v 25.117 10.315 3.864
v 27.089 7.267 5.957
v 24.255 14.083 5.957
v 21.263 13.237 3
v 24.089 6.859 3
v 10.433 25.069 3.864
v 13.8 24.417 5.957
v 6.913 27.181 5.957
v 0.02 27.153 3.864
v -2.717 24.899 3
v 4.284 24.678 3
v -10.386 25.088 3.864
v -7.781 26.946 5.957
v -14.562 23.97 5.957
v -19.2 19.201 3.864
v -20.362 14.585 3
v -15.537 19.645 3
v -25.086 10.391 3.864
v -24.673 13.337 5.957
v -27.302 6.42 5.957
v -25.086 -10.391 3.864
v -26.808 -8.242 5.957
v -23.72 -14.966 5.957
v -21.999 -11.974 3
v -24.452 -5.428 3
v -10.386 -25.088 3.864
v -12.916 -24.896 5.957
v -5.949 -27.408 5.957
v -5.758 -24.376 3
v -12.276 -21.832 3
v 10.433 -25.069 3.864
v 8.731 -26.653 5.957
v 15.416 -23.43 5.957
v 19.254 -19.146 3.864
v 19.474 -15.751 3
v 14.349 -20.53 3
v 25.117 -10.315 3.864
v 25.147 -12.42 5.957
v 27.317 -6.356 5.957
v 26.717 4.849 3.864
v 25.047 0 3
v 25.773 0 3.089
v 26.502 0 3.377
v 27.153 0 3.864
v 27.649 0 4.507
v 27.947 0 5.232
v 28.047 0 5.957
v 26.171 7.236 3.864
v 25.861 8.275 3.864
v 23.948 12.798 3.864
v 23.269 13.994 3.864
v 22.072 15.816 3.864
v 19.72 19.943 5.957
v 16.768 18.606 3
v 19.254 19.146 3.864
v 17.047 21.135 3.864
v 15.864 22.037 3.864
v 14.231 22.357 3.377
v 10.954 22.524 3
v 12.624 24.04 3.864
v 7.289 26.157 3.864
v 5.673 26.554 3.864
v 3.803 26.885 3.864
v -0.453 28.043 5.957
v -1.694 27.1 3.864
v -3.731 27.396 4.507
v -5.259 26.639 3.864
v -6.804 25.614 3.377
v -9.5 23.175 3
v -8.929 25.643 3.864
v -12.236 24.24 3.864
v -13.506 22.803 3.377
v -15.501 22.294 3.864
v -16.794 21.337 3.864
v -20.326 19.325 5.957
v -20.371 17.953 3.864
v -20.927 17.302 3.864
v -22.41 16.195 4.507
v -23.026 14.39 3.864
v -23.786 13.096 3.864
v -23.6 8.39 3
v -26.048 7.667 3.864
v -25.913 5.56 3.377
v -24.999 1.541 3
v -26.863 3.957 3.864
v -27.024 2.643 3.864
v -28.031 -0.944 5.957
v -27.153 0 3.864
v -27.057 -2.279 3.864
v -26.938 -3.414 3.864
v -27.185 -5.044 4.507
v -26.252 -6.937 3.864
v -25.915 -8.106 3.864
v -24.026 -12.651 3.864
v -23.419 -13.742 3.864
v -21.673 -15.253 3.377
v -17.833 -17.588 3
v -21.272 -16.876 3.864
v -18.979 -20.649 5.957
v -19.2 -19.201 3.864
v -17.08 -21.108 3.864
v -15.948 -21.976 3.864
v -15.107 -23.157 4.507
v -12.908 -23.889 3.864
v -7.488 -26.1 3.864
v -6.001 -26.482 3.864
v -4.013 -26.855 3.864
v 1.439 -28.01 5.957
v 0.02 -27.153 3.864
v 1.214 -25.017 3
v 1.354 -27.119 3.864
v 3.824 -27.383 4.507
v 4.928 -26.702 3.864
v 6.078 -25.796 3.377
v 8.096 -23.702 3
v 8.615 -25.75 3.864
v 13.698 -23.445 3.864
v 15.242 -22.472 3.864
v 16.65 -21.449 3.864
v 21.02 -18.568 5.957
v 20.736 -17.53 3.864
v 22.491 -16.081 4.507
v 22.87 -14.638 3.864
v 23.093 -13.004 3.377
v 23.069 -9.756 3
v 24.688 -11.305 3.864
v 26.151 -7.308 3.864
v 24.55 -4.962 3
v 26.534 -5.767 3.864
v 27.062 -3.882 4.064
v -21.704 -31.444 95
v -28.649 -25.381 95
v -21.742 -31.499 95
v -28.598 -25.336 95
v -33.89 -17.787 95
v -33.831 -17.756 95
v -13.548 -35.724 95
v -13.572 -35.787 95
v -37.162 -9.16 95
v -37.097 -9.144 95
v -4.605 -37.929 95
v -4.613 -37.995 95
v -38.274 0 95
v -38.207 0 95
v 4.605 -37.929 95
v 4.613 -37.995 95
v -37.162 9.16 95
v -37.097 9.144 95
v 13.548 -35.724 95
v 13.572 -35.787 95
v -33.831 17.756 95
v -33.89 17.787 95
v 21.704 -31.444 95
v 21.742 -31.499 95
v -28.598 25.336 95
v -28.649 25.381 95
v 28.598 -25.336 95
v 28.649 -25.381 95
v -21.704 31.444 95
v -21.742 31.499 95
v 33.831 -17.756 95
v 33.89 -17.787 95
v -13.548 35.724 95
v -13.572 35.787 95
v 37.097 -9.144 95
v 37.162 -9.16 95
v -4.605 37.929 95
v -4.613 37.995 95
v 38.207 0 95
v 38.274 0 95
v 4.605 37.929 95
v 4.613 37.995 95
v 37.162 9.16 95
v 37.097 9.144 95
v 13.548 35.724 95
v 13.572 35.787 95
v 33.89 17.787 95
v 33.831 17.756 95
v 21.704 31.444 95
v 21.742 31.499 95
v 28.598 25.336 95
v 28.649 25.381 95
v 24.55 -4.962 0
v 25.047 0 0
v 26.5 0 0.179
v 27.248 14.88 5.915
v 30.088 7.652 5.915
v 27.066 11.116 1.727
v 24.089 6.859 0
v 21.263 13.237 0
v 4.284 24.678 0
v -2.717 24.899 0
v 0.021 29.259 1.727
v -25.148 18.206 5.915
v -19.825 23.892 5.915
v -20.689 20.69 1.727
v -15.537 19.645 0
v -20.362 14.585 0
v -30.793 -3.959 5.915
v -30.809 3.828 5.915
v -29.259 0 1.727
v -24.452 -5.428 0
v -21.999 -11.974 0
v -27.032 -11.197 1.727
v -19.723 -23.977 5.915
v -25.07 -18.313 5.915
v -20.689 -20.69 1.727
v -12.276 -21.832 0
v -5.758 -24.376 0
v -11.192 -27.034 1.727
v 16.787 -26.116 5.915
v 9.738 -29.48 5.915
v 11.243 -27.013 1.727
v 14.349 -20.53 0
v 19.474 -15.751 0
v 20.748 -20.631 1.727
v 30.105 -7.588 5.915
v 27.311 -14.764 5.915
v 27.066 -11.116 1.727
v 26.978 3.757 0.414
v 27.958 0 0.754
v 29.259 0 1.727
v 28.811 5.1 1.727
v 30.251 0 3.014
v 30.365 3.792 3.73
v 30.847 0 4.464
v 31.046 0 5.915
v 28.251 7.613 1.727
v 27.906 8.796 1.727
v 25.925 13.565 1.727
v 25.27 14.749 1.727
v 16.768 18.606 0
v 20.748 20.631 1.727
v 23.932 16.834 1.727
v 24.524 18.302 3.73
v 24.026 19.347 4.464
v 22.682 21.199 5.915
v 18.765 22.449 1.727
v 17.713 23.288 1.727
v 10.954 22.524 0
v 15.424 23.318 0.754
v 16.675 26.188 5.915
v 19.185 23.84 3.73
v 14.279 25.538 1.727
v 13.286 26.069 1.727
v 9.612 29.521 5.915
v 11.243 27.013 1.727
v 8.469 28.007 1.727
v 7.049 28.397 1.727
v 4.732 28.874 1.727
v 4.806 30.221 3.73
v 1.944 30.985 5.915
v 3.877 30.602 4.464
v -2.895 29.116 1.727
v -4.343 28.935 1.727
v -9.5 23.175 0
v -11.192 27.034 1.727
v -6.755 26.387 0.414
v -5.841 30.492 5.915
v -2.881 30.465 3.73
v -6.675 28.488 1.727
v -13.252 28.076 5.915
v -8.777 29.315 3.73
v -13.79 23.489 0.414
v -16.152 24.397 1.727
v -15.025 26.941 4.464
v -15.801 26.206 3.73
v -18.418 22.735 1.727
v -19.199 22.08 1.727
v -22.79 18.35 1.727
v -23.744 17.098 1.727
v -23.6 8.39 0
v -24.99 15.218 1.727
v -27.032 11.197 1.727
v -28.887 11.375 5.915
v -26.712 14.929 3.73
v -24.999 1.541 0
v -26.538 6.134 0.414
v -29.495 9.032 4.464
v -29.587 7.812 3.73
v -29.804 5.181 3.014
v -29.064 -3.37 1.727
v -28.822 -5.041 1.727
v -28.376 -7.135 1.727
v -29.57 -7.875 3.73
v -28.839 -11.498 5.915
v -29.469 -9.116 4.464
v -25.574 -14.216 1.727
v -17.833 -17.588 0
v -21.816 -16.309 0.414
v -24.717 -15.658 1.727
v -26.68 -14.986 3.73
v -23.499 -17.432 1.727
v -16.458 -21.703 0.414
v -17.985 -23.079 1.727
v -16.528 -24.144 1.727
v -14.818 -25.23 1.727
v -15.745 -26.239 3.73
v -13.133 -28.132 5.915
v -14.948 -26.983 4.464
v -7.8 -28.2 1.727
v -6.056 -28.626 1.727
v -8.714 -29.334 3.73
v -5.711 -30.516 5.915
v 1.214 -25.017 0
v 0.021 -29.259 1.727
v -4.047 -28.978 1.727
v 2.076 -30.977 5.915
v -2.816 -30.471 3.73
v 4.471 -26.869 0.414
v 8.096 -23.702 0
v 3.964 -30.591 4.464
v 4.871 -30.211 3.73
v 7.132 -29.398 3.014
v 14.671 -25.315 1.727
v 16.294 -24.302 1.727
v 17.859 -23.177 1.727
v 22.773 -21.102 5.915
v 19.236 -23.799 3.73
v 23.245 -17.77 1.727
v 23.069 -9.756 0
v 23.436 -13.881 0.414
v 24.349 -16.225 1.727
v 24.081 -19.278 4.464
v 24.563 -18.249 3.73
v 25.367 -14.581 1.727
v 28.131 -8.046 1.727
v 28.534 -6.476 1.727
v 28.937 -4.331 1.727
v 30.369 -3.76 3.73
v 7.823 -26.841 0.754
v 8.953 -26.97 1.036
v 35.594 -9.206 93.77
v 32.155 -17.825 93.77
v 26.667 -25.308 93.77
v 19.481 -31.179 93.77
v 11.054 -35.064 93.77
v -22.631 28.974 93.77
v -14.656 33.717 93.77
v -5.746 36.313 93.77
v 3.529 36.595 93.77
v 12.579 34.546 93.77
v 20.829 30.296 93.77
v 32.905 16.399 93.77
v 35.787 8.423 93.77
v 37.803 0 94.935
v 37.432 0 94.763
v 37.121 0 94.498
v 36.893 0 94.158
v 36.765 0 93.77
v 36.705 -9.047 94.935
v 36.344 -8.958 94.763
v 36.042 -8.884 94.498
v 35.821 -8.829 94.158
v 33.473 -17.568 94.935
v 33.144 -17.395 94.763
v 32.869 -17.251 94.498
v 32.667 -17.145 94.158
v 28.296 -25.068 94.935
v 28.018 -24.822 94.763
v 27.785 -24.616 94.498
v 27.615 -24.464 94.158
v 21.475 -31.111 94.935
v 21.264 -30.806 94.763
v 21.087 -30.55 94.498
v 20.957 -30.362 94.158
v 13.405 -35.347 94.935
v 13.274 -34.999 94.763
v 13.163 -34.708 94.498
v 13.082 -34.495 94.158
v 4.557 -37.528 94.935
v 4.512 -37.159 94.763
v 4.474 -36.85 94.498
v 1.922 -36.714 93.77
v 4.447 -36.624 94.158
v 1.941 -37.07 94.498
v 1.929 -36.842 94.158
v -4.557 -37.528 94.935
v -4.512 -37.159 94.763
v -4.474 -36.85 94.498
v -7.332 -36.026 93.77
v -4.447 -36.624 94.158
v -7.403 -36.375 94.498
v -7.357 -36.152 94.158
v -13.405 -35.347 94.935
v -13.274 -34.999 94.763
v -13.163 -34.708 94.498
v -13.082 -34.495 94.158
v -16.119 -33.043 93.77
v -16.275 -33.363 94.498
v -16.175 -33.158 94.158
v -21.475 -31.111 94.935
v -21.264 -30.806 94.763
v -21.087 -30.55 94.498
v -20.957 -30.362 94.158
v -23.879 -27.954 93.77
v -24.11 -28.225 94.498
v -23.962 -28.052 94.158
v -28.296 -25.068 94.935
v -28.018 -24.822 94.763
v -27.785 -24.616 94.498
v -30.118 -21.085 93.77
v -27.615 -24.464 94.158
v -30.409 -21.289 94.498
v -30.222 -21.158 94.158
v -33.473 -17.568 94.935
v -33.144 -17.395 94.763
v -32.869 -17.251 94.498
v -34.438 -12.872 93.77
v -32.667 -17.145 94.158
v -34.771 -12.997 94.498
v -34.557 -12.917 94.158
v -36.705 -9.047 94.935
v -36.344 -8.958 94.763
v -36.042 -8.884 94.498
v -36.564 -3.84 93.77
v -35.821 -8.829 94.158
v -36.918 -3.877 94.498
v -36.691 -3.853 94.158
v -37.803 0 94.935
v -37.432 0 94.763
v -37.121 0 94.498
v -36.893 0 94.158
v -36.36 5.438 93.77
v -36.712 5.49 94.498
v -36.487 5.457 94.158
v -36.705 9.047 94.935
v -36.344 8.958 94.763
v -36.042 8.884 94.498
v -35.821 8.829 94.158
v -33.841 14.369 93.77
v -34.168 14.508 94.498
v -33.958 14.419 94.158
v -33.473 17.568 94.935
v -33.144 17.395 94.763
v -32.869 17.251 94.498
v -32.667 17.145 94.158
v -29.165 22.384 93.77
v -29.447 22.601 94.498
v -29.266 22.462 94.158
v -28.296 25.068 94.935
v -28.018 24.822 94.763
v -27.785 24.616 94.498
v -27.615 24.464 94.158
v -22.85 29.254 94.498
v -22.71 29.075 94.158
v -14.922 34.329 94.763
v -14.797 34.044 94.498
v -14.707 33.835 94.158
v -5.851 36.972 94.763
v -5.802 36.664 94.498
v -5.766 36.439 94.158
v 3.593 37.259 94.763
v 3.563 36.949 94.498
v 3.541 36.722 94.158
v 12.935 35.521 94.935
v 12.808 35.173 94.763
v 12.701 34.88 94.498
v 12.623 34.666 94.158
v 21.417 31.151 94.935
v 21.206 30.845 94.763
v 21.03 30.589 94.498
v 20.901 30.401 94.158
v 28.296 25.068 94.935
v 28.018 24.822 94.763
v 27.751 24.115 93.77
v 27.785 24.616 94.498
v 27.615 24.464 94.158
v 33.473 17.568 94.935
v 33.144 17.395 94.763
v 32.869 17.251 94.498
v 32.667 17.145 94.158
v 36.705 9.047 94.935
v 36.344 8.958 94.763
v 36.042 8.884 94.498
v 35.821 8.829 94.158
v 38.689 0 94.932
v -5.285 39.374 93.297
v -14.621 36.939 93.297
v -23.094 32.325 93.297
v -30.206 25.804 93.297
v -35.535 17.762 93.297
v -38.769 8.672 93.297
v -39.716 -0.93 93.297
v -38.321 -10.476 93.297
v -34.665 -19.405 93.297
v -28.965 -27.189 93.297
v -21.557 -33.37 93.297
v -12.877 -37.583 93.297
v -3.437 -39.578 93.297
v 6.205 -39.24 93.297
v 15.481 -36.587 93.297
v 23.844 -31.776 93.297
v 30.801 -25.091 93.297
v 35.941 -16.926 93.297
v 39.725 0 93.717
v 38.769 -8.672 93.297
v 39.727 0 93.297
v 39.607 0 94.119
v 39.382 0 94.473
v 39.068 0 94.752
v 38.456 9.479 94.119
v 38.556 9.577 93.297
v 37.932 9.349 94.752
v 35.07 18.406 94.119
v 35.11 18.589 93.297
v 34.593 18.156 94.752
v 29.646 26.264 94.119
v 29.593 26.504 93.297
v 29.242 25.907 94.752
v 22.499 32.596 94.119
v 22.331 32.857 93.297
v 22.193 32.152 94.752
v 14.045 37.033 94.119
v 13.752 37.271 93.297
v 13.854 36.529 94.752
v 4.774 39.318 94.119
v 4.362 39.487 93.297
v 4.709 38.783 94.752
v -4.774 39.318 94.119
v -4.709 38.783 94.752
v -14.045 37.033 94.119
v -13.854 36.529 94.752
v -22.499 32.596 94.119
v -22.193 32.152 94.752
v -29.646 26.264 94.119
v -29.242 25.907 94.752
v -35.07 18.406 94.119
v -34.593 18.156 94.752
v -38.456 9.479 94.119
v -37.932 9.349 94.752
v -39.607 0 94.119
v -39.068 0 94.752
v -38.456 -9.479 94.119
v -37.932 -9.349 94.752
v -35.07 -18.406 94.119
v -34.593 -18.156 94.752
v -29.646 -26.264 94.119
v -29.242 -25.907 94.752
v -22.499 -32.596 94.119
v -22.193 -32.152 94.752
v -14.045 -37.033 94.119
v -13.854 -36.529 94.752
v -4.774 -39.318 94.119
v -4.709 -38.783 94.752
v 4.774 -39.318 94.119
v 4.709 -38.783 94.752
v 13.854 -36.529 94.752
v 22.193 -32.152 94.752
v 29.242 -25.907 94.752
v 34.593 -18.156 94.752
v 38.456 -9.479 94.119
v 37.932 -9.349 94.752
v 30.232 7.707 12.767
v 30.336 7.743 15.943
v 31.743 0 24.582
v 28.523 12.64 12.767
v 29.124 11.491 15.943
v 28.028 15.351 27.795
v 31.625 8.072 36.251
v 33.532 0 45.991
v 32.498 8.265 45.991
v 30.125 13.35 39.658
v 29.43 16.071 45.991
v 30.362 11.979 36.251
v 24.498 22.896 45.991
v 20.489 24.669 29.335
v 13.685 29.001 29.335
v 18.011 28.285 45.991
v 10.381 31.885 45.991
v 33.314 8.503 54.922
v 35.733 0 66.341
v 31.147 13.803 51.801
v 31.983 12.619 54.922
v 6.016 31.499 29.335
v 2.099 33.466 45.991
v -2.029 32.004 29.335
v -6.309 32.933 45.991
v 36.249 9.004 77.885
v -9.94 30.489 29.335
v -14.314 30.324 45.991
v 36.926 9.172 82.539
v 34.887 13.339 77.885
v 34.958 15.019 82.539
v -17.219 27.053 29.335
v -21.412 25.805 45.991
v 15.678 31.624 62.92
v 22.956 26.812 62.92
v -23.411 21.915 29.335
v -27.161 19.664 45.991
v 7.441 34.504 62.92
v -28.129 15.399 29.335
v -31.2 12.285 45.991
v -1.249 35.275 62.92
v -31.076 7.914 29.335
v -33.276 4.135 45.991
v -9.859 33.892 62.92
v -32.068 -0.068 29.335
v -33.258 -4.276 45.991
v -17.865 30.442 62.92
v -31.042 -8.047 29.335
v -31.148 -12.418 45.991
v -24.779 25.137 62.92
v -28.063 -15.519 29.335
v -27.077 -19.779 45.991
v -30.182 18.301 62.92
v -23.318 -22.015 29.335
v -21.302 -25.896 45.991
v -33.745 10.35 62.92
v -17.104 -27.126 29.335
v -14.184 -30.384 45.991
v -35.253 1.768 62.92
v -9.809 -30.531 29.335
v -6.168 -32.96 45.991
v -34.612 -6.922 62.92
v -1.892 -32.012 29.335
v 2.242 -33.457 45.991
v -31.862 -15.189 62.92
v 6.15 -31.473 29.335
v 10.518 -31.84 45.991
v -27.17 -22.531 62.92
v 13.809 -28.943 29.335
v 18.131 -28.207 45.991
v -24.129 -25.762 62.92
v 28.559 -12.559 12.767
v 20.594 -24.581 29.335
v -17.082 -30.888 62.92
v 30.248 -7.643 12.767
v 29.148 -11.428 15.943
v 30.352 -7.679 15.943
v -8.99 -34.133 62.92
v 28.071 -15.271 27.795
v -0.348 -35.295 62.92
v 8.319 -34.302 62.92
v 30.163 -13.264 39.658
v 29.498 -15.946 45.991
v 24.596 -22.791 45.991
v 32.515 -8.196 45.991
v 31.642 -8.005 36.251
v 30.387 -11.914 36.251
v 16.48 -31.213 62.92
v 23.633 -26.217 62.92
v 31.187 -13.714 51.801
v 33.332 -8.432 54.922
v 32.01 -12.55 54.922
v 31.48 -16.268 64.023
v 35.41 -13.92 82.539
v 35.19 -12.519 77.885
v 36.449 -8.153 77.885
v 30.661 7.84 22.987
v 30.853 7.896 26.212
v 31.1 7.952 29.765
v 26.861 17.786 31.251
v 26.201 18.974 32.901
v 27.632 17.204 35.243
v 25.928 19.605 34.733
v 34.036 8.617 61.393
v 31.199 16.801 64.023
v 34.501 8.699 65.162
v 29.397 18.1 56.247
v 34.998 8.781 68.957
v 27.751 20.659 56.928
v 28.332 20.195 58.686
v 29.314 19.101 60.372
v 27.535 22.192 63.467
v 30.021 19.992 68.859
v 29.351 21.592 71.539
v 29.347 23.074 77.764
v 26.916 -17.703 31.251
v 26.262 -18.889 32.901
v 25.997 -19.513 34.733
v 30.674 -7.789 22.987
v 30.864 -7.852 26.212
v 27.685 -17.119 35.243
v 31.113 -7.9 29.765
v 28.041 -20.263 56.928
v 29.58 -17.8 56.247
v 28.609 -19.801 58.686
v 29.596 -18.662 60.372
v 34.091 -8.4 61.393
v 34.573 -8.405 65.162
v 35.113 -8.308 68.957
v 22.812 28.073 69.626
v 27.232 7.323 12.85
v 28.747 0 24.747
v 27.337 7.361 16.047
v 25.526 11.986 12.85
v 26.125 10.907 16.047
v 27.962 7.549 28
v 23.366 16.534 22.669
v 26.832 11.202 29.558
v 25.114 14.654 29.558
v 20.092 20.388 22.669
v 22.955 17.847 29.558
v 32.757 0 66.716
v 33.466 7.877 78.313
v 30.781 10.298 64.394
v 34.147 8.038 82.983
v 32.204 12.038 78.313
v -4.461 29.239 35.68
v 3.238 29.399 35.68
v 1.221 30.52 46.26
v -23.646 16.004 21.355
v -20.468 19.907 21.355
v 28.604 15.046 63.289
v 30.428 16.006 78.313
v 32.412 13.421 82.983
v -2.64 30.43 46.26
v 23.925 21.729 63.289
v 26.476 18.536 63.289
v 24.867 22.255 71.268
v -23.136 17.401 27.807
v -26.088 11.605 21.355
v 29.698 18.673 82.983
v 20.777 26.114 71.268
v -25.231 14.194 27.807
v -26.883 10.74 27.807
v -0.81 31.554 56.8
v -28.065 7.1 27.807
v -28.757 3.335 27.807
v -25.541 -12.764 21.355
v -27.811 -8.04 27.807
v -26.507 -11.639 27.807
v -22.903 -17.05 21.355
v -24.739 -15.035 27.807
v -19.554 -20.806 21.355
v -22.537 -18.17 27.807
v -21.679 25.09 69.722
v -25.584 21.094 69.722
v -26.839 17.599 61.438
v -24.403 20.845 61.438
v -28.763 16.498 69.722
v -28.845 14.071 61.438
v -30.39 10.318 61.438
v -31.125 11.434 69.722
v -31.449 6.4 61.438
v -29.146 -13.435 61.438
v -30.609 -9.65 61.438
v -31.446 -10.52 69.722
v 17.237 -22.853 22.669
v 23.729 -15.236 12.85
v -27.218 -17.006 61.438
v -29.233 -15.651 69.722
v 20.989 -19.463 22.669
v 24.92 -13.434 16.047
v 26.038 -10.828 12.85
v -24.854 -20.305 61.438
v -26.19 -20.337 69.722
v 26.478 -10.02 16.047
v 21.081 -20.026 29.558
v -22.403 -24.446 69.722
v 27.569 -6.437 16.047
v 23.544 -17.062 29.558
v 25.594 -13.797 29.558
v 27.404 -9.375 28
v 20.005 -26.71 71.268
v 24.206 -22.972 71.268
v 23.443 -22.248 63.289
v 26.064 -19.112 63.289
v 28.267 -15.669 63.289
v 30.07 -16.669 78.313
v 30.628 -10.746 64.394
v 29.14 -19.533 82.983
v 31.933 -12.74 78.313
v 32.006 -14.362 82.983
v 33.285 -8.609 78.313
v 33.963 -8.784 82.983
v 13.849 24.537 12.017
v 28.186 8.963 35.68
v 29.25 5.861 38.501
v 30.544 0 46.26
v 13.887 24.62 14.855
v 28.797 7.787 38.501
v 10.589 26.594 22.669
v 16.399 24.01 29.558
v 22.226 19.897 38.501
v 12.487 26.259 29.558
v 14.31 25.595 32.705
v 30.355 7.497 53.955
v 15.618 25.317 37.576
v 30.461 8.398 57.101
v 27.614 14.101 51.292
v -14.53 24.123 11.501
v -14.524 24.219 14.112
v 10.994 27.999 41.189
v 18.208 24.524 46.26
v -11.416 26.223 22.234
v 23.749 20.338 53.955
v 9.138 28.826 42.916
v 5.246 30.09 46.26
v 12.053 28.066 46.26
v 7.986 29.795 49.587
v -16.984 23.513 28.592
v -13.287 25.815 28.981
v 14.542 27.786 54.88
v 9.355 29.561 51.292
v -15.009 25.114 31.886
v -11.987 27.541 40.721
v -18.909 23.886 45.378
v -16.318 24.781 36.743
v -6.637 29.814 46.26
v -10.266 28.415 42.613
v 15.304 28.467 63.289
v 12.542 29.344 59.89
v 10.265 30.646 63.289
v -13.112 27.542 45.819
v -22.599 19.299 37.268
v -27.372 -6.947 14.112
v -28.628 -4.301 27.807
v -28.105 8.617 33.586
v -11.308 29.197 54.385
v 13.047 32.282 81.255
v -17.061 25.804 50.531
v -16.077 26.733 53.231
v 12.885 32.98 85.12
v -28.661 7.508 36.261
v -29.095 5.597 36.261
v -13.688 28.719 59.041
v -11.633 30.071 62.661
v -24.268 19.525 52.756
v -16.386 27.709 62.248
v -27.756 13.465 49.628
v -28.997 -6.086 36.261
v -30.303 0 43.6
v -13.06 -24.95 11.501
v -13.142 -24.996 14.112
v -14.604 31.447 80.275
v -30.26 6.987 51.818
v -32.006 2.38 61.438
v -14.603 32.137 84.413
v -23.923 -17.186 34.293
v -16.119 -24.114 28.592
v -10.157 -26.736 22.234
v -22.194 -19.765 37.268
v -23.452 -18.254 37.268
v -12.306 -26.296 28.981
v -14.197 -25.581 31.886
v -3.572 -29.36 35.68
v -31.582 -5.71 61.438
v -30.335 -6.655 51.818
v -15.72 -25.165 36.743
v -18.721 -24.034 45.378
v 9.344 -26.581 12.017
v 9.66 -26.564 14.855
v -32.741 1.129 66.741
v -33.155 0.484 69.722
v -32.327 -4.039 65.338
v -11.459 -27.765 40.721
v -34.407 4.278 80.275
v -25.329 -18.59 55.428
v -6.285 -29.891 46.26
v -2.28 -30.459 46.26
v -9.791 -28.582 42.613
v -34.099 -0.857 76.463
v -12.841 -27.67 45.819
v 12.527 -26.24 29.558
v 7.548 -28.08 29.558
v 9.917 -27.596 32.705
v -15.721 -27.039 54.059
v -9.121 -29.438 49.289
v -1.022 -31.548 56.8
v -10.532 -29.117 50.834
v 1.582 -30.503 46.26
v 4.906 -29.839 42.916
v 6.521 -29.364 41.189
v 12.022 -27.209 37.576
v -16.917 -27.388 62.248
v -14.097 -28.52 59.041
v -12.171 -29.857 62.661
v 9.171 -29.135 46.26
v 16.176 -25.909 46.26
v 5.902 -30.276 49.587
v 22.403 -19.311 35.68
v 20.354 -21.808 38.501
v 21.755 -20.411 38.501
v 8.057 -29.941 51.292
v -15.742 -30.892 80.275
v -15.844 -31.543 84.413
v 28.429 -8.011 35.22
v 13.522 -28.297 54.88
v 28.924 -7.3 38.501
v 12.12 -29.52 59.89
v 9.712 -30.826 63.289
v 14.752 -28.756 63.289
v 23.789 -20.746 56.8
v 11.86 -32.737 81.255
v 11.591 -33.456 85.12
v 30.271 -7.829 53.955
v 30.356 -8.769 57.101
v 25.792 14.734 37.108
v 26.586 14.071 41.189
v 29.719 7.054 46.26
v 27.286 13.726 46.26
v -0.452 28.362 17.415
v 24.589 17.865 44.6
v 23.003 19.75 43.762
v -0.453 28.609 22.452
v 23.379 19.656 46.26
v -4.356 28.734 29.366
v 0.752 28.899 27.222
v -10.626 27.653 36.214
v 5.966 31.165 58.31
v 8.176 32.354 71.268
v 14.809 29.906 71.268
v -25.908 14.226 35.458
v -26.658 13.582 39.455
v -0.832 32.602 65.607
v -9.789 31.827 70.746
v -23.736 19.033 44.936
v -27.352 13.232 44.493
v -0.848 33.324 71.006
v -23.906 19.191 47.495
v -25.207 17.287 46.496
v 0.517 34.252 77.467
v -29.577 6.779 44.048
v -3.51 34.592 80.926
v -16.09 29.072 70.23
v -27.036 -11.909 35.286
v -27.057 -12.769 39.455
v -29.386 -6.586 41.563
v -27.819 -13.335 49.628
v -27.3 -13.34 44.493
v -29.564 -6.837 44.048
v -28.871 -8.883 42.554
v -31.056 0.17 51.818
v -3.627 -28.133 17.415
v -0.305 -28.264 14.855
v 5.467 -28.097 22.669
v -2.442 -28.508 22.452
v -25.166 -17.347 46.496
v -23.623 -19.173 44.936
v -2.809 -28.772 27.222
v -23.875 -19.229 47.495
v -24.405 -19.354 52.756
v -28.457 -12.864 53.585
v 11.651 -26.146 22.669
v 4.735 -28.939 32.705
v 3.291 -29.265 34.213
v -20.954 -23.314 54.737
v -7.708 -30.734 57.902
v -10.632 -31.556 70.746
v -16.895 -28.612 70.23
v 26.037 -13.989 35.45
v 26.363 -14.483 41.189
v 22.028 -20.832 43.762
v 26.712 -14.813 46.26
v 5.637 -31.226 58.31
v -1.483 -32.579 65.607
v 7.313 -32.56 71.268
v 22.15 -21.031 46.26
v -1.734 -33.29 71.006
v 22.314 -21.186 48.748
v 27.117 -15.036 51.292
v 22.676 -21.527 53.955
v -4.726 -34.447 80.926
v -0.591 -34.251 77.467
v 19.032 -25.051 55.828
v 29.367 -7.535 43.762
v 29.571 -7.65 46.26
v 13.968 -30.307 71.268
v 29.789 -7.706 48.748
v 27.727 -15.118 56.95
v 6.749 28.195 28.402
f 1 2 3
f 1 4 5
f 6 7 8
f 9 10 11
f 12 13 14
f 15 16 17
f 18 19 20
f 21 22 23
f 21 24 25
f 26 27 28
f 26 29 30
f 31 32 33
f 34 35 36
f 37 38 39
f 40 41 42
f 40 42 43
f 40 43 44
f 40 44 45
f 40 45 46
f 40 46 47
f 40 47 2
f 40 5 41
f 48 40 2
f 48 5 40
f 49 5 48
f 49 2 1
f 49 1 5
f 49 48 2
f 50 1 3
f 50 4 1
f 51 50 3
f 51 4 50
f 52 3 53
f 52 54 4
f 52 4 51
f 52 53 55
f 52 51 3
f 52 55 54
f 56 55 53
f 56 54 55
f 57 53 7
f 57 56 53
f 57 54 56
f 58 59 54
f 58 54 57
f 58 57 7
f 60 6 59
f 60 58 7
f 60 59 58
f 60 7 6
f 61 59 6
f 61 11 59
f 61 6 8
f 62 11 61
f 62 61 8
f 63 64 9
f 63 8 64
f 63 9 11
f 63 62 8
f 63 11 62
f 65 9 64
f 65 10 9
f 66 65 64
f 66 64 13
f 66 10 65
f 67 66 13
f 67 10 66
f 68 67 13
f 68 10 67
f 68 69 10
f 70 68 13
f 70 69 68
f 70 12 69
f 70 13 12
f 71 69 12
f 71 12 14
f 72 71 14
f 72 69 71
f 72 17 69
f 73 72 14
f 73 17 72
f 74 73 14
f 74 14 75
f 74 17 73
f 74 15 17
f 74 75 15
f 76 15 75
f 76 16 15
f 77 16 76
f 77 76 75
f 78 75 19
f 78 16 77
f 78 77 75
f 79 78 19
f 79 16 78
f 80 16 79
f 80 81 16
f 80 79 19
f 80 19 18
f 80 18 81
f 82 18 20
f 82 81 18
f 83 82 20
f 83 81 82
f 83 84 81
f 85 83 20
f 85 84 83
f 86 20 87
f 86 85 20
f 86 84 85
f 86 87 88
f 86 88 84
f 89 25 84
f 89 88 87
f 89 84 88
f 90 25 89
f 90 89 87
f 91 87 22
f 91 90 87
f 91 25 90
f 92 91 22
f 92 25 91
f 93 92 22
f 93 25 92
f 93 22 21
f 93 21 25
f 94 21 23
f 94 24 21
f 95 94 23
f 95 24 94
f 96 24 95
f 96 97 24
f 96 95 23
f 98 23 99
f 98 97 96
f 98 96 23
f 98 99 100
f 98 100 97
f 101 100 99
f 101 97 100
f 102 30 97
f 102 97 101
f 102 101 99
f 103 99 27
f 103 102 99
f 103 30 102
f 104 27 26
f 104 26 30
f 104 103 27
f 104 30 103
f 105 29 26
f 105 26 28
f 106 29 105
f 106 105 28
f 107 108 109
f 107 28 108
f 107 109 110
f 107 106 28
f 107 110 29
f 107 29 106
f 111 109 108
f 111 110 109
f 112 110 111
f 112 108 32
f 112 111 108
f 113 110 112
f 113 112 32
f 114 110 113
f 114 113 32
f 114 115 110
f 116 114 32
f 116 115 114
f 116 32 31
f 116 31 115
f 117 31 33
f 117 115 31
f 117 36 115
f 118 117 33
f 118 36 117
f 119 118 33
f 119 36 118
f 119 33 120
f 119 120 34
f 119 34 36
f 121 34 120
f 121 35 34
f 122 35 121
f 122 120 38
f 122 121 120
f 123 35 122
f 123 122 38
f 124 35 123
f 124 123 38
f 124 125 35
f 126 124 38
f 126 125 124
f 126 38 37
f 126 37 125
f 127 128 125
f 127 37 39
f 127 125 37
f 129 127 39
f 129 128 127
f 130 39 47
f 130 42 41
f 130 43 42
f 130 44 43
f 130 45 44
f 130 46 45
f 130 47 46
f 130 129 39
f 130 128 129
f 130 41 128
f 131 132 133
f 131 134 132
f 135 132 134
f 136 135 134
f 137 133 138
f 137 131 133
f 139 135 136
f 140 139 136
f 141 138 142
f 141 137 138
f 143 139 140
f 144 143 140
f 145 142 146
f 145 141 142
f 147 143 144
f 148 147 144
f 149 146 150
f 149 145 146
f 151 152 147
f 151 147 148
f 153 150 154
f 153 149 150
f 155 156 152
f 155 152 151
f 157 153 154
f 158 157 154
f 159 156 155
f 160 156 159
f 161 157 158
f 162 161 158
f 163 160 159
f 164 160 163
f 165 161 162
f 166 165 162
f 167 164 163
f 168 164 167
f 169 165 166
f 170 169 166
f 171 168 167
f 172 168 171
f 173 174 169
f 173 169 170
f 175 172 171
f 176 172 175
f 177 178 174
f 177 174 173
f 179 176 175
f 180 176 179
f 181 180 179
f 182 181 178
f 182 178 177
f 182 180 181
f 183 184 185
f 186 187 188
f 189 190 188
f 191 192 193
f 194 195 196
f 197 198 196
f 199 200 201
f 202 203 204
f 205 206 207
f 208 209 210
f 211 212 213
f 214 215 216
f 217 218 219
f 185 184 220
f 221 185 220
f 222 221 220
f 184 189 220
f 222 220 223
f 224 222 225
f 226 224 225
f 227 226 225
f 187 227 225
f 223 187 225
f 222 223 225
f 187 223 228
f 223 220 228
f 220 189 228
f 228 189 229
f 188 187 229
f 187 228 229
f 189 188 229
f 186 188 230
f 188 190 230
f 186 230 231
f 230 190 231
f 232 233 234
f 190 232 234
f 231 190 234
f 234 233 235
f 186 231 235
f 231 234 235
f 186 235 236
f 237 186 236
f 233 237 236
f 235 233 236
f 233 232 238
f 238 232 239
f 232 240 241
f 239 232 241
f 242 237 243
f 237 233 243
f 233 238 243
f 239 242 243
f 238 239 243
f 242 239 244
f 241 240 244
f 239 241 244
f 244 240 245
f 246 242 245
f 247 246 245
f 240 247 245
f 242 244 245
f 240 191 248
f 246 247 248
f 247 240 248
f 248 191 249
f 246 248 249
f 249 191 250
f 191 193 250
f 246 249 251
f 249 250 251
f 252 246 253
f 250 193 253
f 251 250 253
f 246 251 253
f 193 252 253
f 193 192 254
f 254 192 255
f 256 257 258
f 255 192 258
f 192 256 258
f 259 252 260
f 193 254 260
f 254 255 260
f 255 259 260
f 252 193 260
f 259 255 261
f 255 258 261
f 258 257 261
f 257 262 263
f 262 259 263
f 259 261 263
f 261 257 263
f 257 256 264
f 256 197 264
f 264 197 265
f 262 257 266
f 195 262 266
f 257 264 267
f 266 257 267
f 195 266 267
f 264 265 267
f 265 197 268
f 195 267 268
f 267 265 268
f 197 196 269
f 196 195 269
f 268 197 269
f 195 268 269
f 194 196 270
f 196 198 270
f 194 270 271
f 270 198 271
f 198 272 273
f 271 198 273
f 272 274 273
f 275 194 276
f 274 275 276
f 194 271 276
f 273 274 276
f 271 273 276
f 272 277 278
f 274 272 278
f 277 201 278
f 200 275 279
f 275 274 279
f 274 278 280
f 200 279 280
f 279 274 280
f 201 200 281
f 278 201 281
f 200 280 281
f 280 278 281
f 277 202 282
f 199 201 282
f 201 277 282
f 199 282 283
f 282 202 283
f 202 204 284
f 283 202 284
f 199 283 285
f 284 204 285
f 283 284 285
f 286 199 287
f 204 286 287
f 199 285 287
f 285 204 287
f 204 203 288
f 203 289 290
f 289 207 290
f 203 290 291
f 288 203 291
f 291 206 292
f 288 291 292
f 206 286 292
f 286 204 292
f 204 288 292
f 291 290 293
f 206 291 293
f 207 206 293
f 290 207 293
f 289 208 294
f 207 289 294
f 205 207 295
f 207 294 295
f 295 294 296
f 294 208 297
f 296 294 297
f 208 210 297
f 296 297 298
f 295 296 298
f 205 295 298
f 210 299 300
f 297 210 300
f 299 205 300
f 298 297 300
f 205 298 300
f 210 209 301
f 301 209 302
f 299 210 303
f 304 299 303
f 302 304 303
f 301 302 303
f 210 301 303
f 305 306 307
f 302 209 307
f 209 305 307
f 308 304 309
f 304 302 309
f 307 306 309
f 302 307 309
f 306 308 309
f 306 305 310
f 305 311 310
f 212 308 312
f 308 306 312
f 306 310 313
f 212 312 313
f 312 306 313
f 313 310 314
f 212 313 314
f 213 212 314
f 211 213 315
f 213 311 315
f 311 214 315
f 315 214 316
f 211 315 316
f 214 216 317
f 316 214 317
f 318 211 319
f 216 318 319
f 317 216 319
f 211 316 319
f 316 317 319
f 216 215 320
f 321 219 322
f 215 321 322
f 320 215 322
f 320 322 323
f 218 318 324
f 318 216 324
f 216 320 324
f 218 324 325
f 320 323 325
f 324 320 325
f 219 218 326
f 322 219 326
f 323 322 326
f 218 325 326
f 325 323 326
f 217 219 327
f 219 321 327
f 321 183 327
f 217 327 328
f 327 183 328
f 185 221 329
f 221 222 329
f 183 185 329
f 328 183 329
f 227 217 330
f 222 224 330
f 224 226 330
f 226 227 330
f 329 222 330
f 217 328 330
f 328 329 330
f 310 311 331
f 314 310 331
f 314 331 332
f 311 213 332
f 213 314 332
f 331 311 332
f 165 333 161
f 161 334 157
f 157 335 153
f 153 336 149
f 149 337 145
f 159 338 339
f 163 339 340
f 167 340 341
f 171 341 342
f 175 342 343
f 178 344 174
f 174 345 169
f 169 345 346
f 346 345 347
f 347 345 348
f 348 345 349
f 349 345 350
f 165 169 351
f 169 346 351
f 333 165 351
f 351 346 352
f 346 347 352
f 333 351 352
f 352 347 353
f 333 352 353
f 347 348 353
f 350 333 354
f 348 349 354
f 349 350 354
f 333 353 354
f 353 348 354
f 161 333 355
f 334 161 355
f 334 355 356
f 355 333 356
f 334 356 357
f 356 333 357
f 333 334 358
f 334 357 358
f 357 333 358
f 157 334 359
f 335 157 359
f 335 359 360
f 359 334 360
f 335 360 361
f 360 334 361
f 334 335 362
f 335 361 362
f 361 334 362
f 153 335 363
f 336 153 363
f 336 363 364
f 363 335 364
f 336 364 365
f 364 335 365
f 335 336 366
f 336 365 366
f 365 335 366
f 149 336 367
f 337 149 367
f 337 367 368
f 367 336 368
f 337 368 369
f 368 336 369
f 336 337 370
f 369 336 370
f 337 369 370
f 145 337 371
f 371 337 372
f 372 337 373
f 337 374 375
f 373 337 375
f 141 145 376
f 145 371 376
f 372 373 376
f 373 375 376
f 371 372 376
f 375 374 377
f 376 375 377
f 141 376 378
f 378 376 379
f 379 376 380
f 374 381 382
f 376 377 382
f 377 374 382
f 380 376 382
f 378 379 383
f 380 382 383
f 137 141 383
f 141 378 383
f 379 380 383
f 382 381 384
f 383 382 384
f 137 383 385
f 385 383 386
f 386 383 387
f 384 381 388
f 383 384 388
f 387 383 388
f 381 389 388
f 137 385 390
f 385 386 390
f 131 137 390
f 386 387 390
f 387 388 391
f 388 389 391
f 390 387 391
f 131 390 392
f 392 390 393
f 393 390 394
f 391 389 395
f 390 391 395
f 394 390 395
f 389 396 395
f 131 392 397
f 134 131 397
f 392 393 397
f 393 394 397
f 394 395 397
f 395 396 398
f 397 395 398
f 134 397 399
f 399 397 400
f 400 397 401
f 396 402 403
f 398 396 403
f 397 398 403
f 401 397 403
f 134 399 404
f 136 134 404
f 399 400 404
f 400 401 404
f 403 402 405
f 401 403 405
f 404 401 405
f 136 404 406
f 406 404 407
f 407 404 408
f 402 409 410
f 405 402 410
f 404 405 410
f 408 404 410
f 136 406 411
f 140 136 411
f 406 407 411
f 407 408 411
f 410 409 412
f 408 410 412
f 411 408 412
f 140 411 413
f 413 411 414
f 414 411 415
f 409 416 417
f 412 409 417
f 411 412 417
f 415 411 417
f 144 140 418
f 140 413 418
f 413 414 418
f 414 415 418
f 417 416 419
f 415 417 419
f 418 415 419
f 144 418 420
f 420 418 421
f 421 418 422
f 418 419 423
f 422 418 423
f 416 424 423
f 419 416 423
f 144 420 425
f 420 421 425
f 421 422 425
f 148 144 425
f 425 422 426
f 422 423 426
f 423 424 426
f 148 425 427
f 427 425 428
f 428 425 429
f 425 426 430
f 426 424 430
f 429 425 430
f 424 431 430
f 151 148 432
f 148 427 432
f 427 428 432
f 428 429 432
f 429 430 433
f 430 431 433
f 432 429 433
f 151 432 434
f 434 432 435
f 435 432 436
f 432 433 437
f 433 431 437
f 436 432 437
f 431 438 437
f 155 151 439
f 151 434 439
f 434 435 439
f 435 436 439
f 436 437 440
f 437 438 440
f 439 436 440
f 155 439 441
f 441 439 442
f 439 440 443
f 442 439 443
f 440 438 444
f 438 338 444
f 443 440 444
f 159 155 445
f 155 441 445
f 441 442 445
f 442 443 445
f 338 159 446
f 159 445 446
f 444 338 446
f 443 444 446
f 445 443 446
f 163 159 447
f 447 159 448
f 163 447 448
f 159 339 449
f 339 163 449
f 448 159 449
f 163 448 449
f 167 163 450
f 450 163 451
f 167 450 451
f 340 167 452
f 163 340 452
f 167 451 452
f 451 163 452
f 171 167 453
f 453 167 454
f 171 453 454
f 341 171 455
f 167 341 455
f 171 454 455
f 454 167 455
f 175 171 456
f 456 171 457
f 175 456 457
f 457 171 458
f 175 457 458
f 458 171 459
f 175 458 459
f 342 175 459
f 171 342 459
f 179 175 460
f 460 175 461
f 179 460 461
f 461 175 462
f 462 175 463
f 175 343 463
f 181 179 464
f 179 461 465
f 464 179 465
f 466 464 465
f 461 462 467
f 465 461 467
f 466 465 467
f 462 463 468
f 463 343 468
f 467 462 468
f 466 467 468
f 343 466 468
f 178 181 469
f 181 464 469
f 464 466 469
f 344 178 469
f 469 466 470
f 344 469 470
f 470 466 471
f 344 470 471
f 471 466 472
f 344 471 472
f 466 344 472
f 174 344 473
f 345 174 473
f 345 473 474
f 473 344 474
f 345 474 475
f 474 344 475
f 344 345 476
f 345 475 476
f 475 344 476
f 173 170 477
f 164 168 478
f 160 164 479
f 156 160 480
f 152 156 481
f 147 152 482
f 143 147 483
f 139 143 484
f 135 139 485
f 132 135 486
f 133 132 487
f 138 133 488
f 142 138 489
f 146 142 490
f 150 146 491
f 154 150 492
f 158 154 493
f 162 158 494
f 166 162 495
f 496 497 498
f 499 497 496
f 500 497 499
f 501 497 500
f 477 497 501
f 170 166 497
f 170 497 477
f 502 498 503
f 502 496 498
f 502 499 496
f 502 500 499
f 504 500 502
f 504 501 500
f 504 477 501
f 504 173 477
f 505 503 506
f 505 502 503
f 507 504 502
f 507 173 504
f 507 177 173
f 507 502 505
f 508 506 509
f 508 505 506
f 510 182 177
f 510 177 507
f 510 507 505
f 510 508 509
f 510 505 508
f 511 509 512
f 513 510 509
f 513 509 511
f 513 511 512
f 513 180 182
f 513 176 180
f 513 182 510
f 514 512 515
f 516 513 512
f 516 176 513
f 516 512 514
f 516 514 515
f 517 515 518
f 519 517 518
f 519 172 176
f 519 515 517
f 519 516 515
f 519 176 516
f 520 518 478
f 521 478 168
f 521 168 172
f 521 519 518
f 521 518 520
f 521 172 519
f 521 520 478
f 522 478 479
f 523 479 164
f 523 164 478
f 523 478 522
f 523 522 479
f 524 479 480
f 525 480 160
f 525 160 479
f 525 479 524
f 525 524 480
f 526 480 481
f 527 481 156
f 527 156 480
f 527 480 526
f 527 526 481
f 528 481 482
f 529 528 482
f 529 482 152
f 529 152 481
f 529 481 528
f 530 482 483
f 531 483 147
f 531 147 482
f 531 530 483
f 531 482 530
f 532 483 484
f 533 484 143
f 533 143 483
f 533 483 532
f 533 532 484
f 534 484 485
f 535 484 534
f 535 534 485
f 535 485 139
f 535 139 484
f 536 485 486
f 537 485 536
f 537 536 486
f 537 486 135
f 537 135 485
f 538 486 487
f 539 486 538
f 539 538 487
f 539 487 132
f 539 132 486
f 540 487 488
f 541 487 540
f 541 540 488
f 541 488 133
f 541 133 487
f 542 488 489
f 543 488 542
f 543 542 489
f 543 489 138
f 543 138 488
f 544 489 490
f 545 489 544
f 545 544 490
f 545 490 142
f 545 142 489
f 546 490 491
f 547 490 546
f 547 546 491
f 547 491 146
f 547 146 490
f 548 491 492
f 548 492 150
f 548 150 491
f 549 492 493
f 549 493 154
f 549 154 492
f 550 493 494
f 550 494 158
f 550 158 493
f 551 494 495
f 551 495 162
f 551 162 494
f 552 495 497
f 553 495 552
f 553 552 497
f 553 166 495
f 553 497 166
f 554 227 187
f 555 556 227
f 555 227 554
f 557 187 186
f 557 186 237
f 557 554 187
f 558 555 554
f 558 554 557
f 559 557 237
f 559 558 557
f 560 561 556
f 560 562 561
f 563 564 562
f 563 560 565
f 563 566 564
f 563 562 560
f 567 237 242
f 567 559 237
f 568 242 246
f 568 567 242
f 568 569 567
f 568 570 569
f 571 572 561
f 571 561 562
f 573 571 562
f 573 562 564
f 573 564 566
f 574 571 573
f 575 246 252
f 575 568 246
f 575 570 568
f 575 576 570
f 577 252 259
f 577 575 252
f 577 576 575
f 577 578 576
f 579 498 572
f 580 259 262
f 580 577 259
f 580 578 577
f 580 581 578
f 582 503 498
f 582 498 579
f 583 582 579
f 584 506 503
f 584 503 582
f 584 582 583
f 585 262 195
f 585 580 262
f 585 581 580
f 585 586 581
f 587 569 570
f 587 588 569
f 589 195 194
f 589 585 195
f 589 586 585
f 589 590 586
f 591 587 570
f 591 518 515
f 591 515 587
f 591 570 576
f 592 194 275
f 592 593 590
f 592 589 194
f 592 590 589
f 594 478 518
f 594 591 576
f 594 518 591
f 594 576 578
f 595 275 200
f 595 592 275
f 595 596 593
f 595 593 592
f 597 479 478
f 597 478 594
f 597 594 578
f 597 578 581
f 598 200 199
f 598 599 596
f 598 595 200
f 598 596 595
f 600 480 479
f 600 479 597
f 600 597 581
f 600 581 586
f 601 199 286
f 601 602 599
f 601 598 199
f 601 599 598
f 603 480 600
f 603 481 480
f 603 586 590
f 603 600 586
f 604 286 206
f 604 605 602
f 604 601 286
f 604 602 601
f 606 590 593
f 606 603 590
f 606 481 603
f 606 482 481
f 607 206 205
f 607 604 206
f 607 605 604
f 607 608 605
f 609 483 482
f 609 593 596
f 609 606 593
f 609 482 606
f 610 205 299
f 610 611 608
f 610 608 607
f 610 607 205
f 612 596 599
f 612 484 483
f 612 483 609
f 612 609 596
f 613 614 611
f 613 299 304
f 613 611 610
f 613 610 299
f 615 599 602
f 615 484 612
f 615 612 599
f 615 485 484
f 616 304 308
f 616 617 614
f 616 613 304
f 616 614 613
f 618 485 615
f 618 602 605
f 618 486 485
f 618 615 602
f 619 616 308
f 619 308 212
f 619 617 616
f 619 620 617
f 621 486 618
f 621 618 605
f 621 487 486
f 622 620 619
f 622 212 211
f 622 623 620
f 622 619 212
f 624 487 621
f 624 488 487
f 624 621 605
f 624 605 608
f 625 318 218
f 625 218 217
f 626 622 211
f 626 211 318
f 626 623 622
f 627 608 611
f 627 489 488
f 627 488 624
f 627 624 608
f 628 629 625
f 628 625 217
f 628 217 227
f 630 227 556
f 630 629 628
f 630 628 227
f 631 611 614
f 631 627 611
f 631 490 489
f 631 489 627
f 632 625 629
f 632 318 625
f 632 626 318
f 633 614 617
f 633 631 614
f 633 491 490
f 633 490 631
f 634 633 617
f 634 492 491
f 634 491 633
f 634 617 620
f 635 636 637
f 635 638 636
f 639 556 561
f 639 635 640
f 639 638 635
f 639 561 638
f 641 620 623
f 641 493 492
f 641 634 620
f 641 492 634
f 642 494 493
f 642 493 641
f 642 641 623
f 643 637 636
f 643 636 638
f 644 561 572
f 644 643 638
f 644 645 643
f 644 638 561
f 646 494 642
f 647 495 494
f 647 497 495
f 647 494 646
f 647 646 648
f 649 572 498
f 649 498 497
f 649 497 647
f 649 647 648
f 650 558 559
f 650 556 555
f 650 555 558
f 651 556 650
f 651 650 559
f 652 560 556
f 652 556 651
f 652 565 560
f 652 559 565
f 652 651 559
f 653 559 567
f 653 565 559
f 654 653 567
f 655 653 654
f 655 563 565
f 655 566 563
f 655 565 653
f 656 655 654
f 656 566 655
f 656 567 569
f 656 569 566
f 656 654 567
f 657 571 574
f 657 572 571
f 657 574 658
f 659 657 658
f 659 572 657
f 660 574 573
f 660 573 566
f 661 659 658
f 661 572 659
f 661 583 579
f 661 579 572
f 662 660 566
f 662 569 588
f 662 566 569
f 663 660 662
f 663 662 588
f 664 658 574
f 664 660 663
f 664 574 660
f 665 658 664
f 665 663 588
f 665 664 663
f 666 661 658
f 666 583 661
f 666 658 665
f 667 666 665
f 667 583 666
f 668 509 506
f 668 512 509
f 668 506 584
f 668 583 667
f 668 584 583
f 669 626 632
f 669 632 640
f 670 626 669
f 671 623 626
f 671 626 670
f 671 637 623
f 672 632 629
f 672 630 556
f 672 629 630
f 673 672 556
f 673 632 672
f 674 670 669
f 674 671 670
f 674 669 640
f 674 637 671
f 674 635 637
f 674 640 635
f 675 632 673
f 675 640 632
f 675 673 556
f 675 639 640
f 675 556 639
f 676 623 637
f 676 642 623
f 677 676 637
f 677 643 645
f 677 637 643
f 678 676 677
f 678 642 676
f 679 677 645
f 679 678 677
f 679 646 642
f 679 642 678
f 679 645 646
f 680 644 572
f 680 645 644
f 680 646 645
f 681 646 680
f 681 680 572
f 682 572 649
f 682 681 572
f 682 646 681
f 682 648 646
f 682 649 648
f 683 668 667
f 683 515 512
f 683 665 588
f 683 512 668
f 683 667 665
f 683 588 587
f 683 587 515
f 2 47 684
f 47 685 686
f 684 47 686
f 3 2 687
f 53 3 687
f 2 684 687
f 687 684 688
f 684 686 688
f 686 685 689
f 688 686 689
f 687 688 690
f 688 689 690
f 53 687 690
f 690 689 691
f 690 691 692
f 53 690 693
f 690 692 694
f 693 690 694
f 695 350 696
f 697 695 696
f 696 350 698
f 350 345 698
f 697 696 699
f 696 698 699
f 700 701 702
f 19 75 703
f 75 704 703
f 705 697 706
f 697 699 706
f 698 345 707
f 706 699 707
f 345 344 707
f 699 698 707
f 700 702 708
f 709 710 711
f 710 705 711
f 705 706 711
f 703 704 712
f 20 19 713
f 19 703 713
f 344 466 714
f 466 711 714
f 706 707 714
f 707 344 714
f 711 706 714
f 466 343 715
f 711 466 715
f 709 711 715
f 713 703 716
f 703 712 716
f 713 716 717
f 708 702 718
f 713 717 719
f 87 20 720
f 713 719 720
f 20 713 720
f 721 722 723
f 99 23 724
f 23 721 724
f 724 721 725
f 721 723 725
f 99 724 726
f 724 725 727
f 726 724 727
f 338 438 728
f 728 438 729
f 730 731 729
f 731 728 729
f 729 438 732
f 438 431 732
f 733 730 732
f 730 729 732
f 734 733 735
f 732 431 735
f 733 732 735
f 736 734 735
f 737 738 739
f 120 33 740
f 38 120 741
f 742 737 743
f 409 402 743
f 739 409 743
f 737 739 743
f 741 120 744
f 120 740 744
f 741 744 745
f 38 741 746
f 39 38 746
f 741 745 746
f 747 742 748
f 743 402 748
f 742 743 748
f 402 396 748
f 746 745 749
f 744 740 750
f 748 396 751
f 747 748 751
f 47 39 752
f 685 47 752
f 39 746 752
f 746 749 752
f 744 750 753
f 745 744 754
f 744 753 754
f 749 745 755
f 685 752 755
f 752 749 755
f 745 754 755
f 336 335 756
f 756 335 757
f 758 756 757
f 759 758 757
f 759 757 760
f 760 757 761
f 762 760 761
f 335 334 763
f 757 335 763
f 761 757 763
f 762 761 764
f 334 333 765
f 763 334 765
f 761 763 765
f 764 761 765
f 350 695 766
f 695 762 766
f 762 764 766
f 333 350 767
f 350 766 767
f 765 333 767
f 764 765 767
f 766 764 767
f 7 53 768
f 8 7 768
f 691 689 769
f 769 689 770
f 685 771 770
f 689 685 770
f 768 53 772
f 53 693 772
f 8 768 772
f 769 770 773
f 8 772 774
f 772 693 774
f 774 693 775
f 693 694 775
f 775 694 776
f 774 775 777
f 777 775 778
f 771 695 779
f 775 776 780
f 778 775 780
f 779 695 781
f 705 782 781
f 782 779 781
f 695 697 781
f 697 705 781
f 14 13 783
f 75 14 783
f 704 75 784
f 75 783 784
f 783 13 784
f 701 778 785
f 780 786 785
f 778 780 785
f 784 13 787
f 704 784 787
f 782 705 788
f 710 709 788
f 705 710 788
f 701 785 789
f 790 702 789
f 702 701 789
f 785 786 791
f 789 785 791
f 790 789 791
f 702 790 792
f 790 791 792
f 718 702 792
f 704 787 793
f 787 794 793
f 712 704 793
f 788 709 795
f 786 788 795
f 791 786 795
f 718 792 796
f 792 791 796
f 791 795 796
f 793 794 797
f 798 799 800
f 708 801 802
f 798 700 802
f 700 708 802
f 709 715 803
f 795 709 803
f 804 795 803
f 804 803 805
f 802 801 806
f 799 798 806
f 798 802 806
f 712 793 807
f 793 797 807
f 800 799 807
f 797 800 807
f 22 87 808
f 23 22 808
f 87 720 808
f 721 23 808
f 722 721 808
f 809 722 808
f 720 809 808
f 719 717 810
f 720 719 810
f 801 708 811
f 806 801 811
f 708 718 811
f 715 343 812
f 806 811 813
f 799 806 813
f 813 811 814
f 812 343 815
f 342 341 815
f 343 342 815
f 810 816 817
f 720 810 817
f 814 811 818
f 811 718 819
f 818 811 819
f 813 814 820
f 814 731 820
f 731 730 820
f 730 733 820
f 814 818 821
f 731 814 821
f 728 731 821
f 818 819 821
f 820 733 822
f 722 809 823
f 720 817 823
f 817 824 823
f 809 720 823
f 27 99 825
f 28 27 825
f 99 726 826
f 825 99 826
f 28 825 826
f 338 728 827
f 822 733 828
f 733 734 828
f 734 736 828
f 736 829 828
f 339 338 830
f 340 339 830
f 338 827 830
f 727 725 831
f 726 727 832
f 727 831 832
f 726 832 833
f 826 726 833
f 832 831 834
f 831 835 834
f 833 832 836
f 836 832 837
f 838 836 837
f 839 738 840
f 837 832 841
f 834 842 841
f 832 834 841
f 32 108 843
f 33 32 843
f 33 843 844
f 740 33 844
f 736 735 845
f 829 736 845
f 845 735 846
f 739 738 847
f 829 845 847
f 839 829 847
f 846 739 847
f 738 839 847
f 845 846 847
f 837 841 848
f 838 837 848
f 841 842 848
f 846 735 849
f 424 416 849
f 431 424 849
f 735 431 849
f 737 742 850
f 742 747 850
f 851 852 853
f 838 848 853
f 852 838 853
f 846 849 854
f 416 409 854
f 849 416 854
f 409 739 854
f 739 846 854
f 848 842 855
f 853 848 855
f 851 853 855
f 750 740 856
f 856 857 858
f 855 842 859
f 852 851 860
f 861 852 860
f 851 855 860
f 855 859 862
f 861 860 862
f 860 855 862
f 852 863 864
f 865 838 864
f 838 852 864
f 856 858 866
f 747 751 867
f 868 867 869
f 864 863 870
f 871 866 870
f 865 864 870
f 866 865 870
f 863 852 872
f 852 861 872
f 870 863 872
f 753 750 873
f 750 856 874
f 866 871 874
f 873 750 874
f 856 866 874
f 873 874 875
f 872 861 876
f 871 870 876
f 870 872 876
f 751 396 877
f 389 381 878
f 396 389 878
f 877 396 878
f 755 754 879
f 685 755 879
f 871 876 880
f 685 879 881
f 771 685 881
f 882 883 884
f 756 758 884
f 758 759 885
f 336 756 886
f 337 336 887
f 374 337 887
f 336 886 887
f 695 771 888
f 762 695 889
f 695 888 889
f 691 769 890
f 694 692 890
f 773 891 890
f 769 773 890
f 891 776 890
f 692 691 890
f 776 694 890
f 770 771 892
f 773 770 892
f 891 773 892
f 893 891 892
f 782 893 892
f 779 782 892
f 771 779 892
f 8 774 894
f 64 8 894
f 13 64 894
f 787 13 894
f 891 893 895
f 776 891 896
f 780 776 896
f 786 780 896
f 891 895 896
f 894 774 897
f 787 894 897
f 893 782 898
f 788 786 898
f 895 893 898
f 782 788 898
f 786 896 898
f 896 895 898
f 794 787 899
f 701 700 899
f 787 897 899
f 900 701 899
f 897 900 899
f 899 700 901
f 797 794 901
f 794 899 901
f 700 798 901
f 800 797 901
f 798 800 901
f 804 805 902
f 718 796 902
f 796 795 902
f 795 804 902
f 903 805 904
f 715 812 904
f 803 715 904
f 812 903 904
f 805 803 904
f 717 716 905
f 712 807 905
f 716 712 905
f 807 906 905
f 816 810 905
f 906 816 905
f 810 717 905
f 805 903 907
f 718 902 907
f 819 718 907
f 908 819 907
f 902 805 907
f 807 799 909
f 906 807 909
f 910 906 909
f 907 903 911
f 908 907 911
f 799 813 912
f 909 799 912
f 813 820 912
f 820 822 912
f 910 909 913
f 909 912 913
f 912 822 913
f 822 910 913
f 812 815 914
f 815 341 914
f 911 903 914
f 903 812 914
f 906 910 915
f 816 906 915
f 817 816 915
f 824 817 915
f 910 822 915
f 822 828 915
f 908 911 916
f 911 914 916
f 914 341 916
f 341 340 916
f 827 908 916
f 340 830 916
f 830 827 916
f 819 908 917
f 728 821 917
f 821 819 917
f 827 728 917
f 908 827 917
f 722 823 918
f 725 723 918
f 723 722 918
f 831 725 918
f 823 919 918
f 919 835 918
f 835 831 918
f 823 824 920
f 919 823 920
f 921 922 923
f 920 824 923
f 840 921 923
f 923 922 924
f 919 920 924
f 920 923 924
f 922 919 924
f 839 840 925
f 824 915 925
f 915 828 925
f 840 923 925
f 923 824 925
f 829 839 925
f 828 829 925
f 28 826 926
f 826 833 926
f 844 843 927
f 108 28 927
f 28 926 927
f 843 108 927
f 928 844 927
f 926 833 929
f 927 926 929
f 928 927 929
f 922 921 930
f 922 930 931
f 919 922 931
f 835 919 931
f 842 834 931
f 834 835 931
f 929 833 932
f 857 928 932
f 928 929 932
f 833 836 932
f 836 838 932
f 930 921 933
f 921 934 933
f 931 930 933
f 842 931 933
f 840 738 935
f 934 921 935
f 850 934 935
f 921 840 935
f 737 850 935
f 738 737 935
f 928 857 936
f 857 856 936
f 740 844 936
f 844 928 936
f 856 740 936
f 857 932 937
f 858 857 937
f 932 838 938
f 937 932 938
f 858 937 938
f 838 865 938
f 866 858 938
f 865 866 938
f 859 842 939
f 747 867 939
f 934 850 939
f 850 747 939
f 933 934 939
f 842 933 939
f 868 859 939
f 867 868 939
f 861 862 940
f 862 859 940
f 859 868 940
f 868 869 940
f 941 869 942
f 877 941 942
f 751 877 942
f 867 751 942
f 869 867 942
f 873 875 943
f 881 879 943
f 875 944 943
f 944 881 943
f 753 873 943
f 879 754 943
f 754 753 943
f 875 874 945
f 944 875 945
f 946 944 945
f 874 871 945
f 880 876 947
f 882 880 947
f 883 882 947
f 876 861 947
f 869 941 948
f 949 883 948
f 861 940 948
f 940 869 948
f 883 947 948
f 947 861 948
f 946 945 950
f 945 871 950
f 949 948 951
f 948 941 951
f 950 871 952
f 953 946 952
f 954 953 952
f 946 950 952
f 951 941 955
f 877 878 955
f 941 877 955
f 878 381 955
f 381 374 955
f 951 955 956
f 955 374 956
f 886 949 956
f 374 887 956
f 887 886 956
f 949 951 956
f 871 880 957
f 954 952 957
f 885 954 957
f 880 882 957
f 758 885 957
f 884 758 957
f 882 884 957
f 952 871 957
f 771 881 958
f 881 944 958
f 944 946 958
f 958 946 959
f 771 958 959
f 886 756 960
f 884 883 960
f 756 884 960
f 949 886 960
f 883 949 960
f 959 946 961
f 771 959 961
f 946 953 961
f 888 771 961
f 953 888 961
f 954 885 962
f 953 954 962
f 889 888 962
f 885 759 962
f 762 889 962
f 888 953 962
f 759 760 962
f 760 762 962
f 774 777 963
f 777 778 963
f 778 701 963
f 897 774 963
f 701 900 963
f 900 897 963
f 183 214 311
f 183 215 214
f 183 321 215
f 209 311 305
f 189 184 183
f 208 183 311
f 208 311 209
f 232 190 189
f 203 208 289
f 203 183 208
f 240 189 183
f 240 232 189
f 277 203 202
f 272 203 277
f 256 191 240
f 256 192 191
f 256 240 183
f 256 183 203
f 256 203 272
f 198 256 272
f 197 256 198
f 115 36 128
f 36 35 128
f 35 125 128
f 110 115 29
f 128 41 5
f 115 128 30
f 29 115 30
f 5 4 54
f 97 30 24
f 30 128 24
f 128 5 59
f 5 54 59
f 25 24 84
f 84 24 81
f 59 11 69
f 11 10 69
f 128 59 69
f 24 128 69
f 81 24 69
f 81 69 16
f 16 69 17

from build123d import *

# Parameters (mm, degrees)
F2_R = 6
F3_T = -3


# Not quite as in the source:
# - a fillet or chamfer that OpenCascade refuses, or shapes differently, is made with other operations: its cross-section is extruded or revolved along the edge and cut away or added


with BuildPart() as f1:
    # F0 (on Front) → F1 (revolve)
    with BuildSketch(Plane.XZ):
        with BuildLine():
            Line((0, 0), (31, 0))
            add(Edge.make_bspline(
                [(31, 0), (31.0335964643, 20.6619363198), (33.7904500865, 46.6403635335), (34.9055384881, 63.2827135687), (40, 95)],
                knots=[0, 0, 0, 0, 0.4771223932, 1, 1, 1, 1], degree=3))
            Line((40, 95), (0, 95))
            Line((0, 95), (0, 0))
        make_face()
    revolve(axis=Axis((0, 0, 47.5), (0, 0, 1)))

    # F2
    f2_edges = [f1.edges().sort_by_distance(p)[0] for p in [
        (-31, 0, 0),
    ]]
    fillet(f2_edges, radius=F2_R)

    # F3
    f3_openings = [f1.faces().sort_by_distance(p)[0] for p in [
        (0, 0, 95),
    ]]
    offset(amount=F3_T, openings=f3_openings)

    # F4: fillet of radius 1.5 on 2 edges, made by hand

    # F4_s1 → F4_t2 (revolve, cut)
    with BuildSketch(Plane.XZ):
        with BuildLine():
            ThreePointArc((39.7221731804, 93.2625963352), (39.3818860804, 94.4734661898), (38.2398082045, 95.0004))
            Line((38.2398082045, 95.0004), (38.2398082045, 95.1505138364))
            ThreePointArc((38.2398082045, 95.1505138364), (39.1199041022, 95.1501138364), (40, 95.1501138364))
            Line((40, 95.1501138364), (40.1482141159, 94.976193704))
            ThreePointArc((40.1482141159, 94.976193704), (40.0089095076, 94.10762509), (39.870409678, 93.2389298051))
            Line((39.870409678, 93.2389298051), (39.7221731804, 93.2625963352))
        make_face()
    revolve(axis=Axis((0, 0, 95), (0, 0, 1)), mode=Mode.SUBTRACT)

    # F4_s3 → F4_t4 (revolve, cut)
    with BuildSketch(Plane.XZ):
        with BuildLine():
            ThreePointArc((38.2417604202, 95.0004), (37.2672082694, 94.6412113654), (36.7588666118, 93.7354756815))
            Line((36.7588666118, 93.7354756815), (36.6105772309, 93.7591506361))
            ThreePointArc((36.6105772309, 93.7591506361), (36.7120450386, 94.3914504759), (36.8133361374, 95.0237774112))
            Line((36.8133361374, 95.0237774112), (36.9616091244, 95.1501673864))
            ThreePointArc((36.9616091244, 95.1501673864), (37.6016847723, 95.1501673864), (38.2417604202, 95.1505673864))
            Line((38.2417604202, 95.1505673864), (38.2417604202, 95.0004))
        make_face()
    revolve(axis=Axis((-6e-10, 1e-10, 95), (0, 0, -1)), mode=Mode.SUBTRACT)


solid = f1.part
